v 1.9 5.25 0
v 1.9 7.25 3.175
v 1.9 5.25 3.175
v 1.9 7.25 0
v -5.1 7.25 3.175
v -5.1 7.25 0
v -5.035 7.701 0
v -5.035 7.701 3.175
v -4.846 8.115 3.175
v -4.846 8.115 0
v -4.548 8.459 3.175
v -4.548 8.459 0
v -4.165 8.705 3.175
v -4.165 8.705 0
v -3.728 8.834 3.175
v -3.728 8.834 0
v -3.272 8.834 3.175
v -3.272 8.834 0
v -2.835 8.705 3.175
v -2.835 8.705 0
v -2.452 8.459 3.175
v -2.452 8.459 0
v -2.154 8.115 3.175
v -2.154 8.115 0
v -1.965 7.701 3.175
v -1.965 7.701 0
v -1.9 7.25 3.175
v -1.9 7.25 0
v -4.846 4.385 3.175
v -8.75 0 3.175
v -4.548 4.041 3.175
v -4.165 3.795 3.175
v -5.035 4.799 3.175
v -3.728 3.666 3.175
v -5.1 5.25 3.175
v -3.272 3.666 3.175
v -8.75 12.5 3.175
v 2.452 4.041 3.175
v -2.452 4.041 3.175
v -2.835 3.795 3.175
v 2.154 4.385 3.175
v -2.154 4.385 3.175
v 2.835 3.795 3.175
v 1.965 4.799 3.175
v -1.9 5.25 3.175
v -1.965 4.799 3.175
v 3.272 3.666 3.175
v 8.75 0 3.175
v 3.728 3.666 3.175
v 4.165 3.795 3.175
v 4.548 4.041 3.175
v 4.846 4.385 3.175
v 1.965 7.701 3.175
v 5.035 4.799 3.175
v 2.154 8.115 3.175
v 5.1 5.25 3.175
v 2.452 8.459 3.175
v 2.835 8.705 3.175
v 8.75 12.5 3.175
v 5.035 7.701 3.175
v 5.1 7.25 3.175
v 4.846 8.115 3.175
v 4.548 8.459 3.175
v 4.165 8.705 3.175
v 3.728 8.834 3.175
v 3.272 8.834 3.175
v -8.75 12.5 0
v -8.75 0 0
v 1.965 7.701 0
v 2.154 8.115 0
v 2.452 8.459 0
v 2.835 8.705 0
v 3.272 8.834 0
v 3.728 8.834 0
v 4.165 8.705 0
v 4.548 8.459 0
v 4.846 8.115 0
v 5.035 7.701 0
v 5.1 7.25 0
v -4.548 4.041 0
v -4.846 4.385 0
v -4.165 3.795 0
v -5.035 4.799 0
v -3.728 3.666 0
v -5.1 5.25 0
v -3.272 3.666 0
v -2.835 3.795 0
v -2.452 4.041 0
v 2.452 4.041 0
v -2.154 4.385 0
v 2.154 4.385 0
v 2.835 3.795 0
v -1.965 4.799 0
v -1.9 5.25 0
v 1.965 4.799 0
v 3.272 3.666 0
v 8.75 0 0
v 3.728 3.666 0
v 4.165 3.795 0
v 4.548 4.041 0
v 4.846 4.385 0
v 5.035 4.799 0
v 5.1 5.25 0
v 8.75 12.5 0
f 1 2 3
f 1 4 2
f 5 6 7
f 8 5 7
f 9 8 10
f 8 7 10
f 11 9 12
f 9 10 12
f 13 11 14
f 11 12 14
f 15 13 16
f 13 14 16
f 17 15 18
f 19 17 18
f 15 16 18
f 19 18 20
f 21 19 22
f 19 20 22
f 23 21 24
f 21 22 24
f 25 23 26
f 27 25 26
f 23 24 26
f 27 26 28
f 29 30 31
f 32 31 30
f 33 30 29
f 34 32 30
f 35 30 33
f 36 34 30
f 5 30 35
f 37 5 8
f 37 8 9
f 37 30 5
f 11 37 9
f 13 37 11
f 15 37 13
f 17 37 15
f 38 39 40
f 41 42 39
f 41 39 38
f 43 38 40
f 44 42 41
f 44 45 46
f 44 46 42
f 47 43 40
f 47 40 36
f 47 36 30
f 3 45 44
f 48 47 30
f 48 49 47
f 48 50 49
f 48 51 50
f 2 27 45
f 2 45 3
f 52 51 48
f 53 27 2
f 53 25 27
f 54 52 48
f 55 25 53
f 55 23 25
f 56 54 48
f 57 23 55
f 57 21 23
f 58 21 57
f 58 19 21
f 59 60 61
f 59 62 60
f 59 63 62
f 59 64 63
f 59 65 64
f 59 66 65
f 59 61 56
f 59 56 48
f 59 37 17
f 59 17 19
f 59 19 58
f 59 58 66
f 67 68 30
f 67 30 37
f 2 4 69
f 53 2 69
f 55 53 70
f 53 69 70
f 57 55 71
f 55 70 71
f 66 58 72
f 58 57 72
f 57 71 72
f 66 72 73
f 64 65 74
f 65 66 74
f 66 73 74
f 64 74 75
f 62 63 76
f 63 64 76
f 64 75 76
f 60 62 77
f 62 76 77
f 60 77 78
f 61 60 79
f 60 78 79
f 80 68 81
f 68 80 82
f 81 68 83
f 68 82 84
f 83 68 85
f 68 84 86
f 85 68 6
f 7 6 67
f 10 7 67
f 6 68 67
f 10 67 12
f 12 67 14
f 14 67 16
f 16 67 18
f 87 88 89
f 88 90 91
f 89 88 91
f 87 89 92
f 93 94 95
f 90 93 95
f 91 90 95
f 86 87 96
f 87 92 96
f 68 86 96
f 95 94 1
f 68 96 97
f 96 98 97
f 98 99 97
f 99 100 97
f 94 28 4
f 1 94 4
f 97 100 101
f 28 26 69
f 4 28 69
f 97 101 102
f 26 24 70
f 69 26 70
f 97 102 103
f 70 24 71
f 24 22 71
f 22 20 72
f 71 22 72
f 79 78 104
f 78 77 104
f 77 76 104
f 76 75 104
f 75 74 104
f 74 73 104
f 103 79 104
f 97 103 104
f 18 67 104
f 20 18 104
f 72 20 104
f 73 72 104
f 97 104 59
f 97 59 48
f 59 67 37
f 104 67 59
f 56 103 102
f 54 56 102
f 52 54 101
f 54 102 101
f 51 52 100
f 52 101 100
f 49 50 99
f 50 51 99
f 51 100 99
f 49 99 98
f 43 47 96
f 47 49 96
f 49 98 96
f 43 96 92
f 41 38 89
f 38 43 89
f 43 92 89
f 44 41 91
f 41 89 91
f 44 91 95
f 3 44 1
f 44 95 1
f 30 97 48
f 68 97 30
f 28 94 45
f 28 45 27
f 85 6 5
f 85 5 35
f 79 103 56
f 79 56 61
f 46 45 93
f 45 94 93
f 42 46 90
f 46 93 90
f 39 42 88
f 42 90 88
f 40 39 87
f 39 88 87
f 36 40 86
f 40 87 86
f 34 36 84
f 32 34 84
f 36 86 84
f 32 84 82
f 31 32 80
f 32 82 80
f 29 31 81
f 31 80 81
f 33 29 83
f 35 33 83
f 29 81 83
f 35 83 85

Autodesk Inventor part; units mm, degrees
ref_plane "YZ Plane" through (0, 0, 0) normal (1, 0, 0) x (0, 1, 0)
ref_plane "XZ Plane" through (0, 0, 0) normal (0, 1, 0) x (-1, 0, 0)
ref_plane "XY Plane" through (0, 0, 0) normal (0, 0, 1) x (1, 0, 0)
sketch "Sketch1" plane through (0, 0, 0) normal (0, 0, 1) x (1, 0, 0)
  line L0 (0, 0) -> (0, 12.5)
  line L1 (0, 12.5) -> (8.75, 12.5)
  line L2 (8.75, 12.5) -> (8.75, 0)
  line L3 (8.75, 0) -> (0, 0)
  line L4 (3.5, 7.25) -> (3.5, 5.25) construction
  line L5 (1.9, 7.25) -> (1.9, 5.25)
  line L6 (5.1, 5.25) -> (5.1, 7.25)
  arc A0 (5.1, 7.25) -> (1.9, 7.25) centre (3.5, 7.25) ccw
  arc A1 (1.9, 5.25) -> (5.1, 5.25) centre (3.5, 5.25) ccw
  point P0 (3.5, 6.25)
  dimension "d13" = 3.2
  dimension "d14" = 2
  dimension "d15" = 6.25
  dimension "d17" = 12.5
  dimension "d18" = 8.75
  dimension "d19" = 3.5
extrude "Extrusion1" add sketch "Sketch1" along normal blind 3.175
mirror "Mirror1" about plane through (0, 12.5, 0) normal (-1, 0, 0) of "Extrusion1"
equation "\"d15\" = 0.5 * d17"
equation "\"d8\" = THICKA"
equation "\"THICKA\" = 3.175"
equation "\"THICKB\" = 6.731"
equation "\"THICKC\" = 12.7"
equation "\"MAGDIA\" = 9.5"
equation "\"BALLDIA\" = 12"
properties part number "Air2D_Hinge_Top"
